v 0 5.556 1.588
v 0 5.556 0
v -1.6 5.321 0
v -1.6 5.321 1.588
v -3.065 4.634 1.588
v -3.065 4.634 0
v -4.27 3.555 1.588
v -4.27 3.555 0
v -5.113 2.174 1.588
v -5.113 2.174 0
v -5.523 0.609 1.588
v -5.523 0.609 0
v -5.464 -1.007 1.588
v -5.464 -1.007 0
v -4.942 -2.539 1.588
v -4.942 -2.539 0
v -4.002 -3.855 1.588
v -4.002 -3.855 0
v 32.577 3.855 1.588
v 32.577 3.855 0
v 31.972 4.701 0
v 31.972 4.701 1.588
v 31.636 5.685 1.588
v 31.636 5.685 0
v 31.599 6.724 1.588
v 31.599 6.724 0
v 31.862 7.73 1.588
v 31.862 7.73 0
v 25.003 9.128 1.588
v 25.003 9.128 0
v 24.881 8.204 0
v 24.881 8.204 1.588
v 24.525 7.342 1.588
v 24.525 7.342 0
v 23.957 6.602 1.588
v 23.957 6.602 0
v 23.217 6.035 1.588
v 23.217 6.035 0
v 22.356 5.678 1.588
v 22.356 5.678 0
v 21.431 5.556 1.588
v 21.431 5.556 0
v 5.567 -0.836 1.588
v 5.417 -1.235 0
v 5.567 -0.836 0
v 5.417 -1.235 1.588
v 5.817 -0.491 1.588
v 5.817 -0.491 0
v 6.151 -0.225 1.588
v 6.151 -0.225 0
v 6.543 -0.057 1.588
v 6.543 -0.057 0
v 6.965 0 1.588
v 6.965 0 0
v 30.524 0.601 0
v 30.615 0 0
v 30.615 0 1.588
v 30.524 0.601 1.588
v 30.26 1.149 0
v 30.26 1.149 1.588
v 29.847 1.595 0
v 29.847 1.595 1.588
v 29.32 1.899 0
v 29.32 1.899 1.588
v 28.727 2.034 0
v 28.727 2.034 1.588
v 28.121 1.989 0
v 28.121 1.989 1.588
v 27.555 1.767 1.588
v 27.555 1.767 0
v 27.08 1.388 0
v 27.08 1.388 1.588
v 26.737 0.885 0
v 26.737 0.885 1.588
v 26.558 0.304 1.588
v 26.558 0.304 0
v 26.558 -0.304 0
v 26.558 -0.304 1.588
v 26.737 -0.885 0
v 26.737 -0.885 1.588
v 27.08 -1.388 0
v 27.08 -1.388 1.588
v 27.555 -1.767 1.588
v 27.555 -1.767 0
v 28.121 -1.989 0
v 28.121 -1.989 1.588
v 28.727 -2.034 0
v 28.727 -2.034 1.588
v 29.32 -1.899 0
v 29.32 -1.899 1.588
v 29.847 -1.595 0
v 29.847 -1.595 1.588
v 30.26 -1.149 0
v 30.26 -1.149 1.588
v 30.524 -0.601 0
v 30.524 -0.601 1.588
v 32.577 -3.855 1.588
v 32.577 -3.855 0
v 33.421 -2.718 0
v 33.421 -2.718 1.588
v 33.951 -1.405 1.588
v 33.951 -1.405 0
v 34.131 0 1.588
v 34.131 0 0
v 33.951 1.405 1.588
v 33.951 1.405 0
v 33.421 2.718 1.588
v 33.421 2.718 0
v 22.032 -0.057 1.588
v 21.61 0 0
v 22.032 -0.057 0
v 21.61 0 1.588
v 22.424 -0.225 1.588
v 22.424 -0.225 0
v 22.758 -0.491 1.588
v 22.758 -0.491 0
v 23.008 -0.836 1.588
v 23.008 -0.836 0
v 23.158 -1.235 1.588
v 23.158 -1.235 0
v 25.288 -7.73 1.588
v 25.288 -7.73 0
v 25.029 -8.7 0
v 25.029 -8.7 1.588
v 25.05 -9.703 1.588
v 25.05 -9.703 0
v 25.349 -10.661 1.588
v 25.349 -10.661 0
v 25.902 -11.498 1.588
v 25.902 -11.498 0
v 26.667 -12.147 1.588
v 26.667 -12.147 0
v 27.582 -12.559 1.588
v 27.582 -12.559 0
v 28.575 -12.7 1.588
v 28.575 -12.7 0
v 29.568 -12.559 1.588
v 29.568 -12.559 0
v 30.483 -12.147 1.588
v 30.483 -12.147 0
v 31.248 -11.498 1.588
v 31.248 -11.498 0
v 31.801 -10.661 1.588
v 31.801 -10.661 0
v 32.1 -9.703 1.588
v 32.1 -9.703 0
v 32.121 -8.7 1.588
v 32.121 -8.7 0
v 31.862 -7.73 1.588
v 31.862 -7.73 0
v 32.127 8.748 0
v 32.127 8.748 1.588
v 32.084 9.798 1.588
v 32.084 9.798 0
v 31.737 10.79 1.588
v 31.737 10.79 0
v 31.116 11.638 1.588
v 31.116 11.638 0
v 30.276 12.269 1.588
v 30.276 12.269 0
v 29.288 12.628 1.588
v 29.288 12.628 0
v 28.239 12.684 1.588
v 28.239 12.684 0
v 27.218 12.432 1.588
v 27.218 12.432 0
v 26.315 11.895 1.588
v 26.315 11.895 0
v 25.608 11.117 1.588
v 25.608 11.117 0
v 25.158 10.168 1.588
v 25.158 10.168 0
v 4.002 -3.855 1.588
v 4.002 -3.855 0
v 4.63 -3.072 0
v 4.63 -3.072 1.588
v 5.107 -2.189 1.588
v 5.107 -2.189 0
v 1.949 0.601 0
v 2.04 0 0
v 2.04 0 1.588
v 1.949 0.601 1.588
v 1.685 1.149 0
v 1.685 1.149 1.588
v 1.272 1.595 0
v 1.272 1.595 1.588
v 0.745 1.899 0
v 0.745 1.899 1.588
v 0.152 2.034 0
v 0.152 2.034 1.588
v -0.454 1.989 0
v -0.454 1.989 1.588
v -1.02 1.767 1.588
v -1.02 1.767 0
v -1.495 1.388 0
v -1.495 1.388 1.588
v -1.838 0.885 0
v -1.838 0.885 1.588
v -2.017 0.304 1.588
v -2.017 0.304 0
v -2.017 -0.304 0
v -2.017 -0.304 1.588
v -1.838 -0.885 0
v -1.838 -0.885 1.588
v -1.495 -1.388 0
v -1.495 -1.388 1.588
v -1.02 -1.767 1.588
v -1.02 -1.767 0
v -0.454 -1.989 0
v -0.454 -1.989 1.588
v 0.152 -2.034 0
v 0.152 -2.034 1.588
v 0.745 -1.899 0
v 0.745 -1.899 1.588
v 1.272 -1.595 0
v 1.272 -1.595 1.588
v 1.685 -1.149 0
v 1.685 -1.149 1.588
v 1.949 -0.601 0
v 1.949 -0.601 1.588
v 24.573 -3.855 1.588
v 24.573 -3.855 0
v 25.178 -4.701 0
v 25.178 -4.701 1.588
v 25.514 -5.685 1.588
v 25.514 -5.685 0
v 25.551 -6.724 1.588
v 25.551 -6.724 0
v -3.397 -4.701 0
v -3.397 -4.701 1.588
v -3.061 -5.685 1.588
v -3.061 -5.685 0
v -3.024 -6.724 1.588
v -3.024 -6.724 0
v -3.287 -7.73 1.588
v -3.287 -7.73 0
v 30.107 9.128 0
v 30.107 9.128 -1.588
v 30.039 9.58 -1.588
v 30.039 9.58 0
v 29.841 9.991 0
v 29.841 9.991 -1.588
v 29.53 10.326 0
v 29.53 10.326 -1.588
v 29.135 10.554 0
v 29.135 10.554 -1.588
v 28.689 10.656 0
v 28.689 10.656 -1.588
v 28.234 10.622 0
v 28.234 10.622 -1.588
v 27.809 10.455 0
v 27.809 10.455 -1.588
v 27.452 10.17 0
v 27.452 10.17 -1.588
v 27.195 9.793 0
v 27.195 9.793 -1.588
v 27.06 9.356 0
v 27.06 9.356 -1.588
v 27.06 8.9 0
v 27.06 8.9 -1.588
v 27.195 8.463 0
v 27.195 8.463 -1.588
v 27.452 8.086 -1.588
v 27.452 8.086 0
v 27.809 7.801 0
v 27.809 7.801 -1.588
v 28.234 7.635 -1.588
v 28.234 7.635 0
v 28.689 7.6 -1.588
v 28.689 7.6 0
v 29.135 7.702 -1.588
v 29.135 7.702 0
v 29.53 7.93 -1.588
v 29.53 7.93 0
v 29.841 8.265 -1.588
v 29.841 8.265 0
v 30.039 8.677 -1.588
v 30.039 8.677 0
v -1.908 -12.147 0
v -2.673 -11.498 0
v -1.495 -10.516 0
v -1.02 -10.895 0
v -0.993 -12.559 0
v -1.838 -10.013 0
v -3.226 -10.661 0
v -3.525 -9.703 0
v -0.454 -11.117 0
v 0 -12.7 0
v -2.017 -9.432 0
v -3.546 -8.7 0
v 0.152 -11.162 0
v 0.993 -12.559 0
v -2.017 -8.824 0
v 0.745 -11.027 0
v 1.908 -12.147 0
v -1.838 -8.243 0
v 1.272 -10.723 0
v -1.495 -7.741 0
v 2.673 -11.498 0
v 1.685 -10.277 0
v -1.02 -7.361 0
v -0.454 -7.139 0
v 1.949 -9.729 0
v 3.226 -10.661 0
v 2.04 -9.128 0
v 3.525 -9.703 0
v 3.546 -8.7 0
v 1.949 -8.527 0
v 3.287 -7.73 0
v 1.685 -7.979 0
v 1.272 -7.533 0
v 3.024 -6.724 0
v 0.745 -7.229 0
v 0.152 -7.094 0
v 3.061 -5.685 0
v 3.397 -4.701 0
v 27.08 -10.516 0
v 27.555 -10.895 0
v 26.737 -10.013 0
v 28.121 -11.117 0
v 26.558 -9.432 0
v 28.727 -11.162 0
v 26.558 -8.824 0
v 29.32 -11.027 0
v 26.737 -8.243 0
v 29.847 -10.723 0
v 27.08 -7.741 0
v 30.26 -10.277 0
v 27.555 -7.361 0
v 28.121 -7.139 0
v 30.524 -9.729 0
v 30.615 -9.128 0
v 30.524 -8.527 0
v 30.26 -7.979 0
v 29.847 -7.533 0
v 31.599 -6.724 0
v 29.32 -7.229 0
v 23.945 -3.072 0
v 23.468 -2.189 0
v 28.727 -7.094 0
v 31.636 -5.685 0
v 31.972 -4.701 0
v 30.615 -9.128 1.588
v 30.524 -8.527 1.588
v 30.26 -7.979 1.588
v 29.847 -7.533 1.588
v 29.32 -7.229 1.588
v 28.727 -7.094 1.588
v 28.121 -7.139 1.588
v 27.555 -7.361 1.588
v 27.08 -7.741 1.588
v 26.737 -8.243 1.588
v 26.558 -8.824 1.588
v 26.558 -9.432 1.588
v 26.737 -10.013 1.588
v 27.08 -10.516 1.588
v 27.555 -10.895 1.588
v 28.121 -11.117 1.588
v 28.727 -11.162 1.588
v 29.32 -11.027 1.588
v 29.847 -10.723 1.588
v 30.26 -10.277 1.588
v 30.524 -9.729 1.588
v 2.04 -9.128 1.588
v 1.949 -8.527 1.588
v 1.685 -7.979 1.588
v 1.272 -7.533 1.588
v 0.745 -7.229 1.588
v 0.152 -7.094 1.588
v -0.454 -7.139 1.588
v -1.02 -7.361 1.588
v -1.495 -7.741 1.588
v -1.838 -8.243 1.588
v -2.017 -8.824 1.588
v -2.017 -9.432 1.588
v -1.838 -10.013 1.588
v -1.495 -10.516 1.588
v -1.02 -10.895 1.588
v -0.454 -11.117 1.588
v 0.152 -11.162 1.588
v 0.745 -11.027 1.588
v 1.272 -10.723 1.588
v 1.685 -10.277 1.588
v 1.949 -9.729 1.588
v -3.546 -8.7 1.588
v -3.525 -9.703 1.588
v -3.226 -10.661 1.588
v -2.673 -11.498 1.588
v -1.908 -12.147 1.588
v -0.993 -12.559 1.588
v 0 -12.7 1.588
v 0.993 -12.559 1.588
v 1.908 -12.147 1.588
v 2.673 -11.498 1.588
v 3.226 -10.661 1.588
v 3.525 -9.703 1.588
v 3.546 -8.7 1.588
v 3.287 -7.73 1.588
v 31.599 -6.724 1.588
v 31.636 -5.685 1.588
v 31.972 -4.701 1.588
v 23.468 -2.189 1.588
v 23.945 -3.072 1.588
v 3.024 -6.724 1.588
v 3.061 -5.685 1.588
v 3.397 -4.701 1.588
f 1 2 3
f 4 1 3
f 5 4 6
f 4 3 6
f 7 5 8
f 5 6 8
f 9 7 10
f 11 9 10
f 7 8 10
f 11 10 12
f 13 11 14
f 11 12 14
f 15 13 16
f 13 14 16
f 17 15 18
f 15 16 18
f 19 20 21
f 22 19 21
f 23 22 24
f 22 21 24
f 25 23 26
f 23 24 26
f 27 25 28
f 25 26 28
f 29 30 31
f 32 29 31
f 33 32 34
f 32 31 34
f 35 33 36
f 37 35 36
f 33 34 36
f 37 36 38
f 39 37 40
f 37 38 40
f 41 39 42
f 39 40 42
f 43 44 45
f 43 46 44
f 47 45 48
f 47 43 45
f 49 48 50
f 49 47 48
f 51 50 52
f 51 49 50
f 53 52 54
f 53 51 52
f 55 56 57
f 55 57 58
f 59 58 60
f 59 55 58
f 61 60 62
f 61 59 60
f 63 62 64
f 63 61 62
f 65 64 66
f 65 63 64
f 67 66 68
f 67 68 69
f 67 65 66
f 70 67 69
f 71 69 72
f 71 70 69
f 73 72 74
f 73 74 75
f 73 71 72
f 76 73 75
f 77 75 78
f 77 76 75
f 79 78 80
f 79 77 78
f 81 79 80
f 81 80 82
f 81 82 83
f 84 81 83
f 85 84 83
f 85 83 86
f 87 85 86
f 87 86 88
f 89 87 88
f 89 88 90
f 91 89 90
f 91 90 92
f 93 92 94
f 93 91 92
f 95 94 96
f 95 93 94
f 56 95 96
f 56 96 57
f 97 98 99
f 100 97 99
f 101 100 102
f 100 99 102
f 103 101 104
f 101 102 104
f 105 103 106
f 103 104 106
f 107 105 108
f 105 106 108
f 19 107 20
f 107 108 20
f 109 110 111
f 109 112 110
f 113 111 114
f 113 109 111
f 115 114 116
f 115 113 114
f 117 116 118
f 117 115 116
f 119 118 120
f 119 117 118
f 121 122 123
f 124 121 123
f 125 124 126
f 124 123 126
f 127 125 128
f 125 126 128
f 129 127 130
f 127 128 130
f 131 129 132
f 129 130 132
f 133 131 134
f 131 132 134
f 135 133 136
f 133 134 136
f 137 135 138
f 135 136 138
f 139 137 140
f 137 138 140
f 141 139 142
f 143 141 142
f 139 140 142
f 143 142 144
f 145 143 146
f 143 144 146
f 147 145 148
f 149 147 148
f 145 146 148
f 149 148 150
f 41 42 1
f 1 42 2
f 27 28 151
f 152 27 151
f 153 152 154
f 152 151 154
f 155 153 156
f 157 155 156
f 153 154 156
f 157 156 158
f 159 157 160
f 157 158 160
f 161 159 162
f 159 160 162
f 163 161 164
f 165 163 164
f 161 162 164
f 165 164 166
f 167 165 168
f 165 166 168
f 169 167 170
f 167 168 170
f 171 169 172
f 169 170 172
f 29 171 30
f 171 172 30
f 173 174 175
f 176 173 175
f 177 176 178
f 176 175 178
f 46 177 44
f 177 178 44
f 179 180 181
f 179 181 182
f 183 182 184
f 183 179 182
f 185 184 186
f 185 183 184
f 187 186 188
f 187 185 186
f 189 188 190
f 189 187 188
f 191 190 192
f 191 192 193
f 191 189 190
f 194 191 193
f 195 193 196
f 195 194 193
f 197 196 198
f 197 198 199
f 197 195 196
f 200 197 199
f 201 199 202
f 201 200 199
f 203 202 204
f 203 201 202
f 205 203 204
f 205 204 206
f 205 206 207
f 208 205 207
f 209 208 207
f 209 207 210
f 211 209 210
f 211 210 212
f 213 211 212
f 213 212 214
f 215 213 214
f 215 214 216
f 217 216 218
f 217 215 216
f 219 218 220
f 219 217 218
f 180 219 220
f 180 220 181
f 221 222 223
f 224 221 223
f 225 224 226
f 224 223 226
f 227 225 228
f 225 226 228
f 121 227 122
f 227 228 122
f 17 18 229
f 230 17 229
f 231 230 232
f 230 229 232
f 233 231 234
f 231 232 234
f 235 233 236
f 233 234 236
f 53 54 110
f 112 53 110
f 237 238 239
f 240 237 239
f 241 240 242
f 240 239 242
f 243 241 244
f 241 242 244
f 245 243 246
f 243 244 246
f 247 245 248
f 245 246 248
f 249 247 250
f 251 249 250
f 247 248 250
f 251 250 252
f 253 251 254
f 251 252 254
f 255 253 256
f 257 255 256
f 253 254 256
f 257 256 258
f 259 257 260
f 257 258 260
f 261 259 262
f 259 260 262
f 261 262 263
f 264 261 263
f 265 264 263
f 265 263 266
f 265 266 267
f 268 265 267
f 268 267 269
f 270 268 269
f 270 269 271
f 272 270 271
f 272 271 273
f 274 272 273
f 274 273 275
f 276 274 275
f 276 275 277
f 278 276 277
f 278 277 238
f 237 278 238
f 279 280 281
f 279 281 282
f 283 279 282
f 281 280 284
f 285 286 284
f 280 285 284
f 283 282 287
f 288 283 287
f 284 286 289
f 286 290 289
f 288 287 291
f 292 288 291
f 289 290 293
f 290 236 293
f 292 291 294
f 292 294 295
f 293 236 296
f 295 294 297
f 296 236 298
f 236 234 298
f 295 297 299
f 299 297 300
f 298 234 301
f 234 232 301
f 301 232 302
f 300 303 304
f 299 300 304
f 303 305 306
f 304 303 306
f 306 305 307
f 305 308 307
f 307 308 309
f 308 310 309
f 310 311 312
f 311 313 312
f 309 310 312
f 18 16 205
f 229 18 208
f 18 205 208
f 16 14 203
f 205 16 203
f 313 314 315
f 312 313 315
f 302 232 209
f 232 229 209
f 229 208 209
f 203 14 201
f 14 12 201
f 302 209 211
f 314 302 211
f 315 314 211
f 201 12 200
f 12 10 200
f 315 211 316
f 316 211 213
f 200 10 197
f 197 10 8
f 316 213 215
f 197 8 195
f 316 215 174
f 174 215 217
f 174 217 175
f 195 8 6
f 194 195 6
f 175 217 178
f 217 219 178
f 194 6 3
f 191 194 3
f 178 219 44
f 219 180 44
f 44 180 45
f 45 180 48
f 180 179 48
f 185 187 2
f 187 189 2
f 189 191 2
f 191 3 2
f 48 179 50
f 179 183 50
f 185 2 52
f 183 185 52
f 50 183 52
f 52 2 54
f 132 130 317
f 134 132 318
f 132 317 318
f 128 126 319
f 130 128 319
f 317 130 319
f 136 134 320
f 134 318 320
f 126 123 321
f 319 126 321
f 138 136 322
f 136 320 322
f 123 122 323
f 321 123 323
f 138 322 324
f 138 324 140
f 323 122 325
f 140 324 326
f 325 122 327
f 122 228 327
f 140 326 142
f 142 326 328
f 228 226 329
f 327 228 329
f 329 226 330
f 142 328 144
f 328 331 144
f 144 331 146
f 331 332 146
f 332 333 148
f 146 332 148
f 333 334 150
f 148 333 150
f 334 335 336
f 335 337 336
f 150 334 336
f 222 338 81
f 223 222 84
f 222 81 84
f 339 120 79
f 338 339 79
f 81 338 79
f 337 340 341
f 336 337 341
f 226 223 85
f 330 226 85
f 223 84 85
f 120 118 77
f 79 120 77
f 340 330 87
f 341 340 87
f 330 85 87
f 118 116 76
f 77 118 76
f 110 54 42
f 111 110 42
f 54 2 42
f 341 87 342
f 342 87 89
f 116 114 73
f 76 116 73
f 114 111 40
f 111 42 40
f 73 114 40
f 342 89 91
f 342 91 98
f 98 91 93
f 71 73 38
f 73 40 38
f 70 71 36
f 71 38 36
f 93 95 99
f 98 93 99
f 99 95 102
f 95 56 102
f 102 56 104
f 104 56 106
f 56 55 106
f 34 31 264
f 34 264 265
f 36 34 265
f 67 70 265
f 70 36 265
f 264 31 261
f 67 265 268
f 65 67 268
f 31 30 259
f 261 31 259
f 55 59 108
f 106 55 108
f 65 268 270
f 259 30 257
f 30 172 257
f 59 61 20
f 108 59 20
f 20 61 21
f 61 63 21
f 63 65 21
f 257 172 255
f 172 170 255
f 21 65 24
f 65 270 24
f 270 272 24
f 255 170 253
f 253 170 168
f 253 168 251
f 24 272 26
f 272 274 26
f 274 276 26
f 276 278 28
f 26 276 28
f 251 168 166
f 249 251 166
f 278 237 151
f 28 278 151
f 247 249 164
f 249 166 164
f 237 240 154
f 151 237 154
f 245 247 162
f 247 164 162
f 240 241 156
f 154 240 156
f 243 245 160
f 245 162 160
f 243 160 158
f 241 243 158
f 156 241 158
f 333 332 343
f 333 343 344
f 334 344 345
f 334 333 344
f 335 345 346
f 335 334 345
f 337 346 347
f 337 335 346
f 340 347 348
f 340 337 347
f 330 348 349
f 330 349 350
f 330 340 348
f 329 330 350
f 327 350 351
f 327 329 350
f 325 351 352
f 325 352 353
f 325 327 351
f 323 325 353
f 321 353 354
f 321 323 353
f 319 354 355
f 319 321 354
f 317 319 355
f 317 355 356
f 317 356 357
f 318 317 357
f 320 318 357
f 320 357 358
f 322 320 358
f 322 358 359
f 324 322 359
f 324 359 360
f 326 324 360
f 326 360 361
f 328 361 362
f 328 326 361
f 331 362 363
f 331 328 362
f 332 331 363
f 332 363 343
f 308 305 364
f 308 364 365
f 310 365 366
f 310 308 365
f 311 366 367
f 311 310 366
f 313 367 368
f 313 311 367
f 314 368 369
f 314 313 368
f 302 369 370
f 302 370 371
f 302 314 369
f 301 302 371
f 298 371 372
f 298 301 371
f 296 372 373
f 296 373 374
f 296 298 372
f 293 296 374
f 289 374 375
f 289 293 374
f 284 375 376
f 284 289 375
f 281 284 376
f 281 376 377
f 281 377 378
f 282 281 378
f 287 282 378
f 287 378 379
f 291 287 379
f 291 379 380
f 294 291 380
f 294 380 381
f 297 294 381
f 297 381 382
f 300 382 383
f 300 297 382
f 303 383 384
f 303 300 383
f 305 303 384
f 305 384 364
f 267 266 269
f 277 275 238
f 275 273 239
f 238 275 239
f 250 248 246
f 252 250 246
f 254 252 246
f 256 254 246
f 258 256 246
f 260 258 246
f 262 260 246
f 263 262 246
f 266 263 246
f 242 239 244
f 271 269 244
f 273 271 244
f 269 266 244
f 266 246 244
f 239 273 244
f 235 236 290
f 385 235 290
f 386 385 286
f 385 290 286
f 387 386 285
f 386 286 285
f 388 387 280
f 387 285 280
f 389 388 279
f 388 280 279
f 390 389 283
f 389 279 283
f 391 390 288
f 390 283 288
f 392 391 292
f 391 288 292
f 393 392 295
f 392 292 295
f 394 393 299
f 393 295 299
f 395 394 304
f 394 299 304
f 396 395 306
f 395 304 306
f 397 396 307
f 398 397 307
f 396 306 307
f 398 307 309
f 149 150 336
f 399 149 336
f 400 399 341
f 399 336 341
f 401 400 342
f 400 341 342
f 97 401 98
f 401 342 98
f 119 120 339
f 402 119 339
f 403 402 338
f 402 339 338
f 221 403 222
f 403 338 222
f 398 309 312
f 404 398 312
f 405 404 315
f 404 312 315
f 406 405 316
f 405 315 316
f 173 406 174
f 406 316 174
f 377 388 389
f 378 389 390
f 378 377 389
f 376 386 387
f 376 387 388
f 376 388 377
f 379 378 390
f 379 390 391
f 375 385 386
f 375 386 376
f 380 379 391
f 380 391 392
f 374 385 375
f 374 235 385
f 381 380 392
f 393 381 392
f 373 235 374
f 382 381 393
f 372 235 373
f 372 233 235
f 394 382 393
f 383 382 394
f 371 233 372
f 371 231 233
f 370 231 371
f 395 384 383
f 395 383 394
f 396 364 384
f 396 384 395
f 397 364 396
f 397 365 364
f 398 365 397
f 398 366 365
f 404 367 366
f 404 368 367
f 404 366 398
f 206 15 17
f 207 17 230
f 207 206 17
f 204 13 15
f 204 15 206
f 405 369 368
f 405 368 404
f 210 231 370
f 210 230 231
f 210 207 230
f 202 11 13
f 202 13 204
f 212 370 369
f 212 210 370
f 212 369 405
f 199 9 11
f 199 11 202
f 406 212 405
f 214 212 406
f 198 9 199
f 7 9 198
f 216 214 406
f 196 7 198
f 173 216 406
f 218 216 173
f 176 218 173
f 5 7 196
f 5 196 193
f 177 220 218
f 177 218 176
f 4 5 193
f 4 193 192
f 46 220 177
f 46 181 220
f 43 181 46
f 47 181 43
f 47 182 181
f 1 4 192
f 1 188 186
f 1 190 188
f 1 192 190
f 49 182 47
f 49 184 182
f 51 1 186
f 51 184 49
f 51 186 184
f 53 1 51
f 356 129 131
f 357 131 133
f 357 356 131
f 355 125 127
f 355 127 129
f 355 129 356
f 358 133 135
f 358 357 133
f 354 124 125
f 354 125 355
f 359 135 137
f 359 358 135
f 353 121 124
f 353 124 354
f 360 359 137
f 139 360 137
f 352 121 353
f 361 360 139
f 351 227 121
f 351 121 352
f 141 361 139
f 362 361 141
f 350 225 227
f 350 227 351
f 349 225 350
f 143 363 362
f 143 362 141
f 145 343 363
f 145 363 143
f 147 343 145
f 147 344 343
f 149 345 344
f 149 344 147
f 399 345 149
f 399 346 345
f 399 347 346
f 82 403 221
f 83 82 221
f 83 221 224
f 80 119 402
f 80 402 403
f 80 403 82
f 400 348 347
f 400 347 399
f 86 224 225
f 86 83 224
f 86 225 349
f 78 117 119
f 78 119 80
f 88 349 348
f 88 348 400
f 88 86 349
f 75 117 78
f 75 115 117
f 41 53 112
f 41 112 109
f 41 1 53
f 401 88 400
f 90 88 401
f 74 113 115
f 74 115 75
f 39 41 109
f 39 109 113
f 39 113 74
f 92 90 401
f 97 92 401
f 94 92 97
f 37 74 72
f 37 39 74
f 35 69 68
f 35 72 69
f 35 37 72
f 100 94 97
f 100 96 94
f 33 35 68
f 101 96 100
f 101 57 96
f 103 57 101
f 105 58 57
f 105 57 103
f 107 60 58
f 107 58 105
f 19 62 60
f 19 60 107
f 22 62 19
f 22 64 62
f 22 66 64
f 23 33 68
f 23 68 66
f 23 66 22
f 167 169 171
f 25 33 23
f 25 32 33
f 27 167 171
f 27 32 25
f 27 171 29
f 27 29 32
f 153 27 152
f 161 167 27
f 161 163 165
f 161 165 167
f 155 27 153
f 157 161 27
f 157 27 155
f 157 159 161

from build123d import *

# Parameters (mm, degrees)
SKETCH2_R                = 2.0399375
SKETCH2_R_2              = 1.5319375
BOSS_EXTRUDE1_DEPTH      = 1.5875
BOSS_EXTRUDE3_DEPTH      = 1.5875
BOSS_EXTRUDE3_DEPTH_BACK = 1.5875
SKETCH2_4_R              = 1.5319375
FILLET1_R                = 1.5875


with BuildPart() as part:
    # Sketch2 → Boss-Extrude1 (new body)
    with BuildSketch(Plane.XY):
        with BuildLine():
            ThreePointArc((0, 5.55625), (-5.113202022, 2.174184709), (-4.001636229, -3.854714199))
            ThreePointArc((-4.001636229, -3.854714199), (-3.061446645, -5.685103398), (-3.287058415, -7.730434766))
            ThreePointArc((-3.287058415, -7.730434766), (0, -12.7), (3.287058415, -7.730434766))
            ThreePointArc((3.287058415, -7.730434766), (3.061446641, -5.685103418), (4.0016362, -3.854714229))
            ThreePointArc((4.0016362, -3.854714229), (5.152960566, -2.078199091), (5.55625, 0))
            Line((5.55625, 0), (23.01875, 0))
            ThreePointArc((23.01875, 0), (23.422039385, -2.07819897), (24.573363619, -3.854714041))
            ThreePointArc((24.573363619, -3.854714041), (25.513553344, -5.685103337), (25.287941547, -7.730434854))
            ThreePointArc((25.287941547, -7.730434854), (28.575000048, -12.7), (31.862058415, -7.730434766))
            ThreePointArc((31.862058415, -7.730434766), (31.636446655, -5.685103342), (32.576636308, -3.854714117))
            ThreePointArc((32.576636308, -3.854714117), (34.13125, -7.3e-08), (32.576636409, 3.854714012))
            ThreePointArc((32.576636409, 3.854714012), (31.636446674, 5.685103241), (31.862058392, 7.730434711))
            ThreePointArc((31.862058392, 7.730434711), (29.288207306, 12.628071622), (25.003125, 9.128125))
            ThreePointArc((25.003125, 9.128125), (23.956947034, 6.602427966), (21.43125, 5.55625))
            Line((21.43125, 5.55625), (0, 5.55625))
        make_face()
        Circle(SKETCH2_R, mode=Mode.SUBTRACT)
        with Locations((28.575, 0)):
            Circle(SKETCH2_R, mode=Mode.SUBTRACT)
        with Locations((28.575, 9.128125)):
            Circle(SKETCH2_R_2, mode=Mode.SUBTRACT)
        with Locations((0, -9.128125)):
            Circle(SKETCH2_R, mode=Mode.SUBTRACT)
        with Locations((28.575, -9.128125)):
            Circle(SKETCH2_R, mode=Mode.SUBTRACT)
    extrude(amount=BOSS_EXTRUDE1_DEPTH)

    # Sketch2<4> → Boss-Extrude3 (add, two sides: drawn at the far end of the back side and taken through both)
    with BuildSketch(Plane.XY.offset(-BOSS_EXTRUDE3_DEPTH_BACK)):
        with Locations((28.575, 9.128125)):
            Circle(SKETCH2_4_R)
    extrude(amount=BOSS_EXTRUDE3_DEPTH + BOSS_EXTRUDE3_DEPTH_BACK)

    # Fillet1
    fillet1_edges = [part.edges().sort_by_distance(p)[0] for p in [
        (23.01875, 0, 0.79375),
        (5.55625, 0, 0.79375),
    ]]
    fillet(fillet1_edges, radius=FILLET1_R)


solid = part.part
